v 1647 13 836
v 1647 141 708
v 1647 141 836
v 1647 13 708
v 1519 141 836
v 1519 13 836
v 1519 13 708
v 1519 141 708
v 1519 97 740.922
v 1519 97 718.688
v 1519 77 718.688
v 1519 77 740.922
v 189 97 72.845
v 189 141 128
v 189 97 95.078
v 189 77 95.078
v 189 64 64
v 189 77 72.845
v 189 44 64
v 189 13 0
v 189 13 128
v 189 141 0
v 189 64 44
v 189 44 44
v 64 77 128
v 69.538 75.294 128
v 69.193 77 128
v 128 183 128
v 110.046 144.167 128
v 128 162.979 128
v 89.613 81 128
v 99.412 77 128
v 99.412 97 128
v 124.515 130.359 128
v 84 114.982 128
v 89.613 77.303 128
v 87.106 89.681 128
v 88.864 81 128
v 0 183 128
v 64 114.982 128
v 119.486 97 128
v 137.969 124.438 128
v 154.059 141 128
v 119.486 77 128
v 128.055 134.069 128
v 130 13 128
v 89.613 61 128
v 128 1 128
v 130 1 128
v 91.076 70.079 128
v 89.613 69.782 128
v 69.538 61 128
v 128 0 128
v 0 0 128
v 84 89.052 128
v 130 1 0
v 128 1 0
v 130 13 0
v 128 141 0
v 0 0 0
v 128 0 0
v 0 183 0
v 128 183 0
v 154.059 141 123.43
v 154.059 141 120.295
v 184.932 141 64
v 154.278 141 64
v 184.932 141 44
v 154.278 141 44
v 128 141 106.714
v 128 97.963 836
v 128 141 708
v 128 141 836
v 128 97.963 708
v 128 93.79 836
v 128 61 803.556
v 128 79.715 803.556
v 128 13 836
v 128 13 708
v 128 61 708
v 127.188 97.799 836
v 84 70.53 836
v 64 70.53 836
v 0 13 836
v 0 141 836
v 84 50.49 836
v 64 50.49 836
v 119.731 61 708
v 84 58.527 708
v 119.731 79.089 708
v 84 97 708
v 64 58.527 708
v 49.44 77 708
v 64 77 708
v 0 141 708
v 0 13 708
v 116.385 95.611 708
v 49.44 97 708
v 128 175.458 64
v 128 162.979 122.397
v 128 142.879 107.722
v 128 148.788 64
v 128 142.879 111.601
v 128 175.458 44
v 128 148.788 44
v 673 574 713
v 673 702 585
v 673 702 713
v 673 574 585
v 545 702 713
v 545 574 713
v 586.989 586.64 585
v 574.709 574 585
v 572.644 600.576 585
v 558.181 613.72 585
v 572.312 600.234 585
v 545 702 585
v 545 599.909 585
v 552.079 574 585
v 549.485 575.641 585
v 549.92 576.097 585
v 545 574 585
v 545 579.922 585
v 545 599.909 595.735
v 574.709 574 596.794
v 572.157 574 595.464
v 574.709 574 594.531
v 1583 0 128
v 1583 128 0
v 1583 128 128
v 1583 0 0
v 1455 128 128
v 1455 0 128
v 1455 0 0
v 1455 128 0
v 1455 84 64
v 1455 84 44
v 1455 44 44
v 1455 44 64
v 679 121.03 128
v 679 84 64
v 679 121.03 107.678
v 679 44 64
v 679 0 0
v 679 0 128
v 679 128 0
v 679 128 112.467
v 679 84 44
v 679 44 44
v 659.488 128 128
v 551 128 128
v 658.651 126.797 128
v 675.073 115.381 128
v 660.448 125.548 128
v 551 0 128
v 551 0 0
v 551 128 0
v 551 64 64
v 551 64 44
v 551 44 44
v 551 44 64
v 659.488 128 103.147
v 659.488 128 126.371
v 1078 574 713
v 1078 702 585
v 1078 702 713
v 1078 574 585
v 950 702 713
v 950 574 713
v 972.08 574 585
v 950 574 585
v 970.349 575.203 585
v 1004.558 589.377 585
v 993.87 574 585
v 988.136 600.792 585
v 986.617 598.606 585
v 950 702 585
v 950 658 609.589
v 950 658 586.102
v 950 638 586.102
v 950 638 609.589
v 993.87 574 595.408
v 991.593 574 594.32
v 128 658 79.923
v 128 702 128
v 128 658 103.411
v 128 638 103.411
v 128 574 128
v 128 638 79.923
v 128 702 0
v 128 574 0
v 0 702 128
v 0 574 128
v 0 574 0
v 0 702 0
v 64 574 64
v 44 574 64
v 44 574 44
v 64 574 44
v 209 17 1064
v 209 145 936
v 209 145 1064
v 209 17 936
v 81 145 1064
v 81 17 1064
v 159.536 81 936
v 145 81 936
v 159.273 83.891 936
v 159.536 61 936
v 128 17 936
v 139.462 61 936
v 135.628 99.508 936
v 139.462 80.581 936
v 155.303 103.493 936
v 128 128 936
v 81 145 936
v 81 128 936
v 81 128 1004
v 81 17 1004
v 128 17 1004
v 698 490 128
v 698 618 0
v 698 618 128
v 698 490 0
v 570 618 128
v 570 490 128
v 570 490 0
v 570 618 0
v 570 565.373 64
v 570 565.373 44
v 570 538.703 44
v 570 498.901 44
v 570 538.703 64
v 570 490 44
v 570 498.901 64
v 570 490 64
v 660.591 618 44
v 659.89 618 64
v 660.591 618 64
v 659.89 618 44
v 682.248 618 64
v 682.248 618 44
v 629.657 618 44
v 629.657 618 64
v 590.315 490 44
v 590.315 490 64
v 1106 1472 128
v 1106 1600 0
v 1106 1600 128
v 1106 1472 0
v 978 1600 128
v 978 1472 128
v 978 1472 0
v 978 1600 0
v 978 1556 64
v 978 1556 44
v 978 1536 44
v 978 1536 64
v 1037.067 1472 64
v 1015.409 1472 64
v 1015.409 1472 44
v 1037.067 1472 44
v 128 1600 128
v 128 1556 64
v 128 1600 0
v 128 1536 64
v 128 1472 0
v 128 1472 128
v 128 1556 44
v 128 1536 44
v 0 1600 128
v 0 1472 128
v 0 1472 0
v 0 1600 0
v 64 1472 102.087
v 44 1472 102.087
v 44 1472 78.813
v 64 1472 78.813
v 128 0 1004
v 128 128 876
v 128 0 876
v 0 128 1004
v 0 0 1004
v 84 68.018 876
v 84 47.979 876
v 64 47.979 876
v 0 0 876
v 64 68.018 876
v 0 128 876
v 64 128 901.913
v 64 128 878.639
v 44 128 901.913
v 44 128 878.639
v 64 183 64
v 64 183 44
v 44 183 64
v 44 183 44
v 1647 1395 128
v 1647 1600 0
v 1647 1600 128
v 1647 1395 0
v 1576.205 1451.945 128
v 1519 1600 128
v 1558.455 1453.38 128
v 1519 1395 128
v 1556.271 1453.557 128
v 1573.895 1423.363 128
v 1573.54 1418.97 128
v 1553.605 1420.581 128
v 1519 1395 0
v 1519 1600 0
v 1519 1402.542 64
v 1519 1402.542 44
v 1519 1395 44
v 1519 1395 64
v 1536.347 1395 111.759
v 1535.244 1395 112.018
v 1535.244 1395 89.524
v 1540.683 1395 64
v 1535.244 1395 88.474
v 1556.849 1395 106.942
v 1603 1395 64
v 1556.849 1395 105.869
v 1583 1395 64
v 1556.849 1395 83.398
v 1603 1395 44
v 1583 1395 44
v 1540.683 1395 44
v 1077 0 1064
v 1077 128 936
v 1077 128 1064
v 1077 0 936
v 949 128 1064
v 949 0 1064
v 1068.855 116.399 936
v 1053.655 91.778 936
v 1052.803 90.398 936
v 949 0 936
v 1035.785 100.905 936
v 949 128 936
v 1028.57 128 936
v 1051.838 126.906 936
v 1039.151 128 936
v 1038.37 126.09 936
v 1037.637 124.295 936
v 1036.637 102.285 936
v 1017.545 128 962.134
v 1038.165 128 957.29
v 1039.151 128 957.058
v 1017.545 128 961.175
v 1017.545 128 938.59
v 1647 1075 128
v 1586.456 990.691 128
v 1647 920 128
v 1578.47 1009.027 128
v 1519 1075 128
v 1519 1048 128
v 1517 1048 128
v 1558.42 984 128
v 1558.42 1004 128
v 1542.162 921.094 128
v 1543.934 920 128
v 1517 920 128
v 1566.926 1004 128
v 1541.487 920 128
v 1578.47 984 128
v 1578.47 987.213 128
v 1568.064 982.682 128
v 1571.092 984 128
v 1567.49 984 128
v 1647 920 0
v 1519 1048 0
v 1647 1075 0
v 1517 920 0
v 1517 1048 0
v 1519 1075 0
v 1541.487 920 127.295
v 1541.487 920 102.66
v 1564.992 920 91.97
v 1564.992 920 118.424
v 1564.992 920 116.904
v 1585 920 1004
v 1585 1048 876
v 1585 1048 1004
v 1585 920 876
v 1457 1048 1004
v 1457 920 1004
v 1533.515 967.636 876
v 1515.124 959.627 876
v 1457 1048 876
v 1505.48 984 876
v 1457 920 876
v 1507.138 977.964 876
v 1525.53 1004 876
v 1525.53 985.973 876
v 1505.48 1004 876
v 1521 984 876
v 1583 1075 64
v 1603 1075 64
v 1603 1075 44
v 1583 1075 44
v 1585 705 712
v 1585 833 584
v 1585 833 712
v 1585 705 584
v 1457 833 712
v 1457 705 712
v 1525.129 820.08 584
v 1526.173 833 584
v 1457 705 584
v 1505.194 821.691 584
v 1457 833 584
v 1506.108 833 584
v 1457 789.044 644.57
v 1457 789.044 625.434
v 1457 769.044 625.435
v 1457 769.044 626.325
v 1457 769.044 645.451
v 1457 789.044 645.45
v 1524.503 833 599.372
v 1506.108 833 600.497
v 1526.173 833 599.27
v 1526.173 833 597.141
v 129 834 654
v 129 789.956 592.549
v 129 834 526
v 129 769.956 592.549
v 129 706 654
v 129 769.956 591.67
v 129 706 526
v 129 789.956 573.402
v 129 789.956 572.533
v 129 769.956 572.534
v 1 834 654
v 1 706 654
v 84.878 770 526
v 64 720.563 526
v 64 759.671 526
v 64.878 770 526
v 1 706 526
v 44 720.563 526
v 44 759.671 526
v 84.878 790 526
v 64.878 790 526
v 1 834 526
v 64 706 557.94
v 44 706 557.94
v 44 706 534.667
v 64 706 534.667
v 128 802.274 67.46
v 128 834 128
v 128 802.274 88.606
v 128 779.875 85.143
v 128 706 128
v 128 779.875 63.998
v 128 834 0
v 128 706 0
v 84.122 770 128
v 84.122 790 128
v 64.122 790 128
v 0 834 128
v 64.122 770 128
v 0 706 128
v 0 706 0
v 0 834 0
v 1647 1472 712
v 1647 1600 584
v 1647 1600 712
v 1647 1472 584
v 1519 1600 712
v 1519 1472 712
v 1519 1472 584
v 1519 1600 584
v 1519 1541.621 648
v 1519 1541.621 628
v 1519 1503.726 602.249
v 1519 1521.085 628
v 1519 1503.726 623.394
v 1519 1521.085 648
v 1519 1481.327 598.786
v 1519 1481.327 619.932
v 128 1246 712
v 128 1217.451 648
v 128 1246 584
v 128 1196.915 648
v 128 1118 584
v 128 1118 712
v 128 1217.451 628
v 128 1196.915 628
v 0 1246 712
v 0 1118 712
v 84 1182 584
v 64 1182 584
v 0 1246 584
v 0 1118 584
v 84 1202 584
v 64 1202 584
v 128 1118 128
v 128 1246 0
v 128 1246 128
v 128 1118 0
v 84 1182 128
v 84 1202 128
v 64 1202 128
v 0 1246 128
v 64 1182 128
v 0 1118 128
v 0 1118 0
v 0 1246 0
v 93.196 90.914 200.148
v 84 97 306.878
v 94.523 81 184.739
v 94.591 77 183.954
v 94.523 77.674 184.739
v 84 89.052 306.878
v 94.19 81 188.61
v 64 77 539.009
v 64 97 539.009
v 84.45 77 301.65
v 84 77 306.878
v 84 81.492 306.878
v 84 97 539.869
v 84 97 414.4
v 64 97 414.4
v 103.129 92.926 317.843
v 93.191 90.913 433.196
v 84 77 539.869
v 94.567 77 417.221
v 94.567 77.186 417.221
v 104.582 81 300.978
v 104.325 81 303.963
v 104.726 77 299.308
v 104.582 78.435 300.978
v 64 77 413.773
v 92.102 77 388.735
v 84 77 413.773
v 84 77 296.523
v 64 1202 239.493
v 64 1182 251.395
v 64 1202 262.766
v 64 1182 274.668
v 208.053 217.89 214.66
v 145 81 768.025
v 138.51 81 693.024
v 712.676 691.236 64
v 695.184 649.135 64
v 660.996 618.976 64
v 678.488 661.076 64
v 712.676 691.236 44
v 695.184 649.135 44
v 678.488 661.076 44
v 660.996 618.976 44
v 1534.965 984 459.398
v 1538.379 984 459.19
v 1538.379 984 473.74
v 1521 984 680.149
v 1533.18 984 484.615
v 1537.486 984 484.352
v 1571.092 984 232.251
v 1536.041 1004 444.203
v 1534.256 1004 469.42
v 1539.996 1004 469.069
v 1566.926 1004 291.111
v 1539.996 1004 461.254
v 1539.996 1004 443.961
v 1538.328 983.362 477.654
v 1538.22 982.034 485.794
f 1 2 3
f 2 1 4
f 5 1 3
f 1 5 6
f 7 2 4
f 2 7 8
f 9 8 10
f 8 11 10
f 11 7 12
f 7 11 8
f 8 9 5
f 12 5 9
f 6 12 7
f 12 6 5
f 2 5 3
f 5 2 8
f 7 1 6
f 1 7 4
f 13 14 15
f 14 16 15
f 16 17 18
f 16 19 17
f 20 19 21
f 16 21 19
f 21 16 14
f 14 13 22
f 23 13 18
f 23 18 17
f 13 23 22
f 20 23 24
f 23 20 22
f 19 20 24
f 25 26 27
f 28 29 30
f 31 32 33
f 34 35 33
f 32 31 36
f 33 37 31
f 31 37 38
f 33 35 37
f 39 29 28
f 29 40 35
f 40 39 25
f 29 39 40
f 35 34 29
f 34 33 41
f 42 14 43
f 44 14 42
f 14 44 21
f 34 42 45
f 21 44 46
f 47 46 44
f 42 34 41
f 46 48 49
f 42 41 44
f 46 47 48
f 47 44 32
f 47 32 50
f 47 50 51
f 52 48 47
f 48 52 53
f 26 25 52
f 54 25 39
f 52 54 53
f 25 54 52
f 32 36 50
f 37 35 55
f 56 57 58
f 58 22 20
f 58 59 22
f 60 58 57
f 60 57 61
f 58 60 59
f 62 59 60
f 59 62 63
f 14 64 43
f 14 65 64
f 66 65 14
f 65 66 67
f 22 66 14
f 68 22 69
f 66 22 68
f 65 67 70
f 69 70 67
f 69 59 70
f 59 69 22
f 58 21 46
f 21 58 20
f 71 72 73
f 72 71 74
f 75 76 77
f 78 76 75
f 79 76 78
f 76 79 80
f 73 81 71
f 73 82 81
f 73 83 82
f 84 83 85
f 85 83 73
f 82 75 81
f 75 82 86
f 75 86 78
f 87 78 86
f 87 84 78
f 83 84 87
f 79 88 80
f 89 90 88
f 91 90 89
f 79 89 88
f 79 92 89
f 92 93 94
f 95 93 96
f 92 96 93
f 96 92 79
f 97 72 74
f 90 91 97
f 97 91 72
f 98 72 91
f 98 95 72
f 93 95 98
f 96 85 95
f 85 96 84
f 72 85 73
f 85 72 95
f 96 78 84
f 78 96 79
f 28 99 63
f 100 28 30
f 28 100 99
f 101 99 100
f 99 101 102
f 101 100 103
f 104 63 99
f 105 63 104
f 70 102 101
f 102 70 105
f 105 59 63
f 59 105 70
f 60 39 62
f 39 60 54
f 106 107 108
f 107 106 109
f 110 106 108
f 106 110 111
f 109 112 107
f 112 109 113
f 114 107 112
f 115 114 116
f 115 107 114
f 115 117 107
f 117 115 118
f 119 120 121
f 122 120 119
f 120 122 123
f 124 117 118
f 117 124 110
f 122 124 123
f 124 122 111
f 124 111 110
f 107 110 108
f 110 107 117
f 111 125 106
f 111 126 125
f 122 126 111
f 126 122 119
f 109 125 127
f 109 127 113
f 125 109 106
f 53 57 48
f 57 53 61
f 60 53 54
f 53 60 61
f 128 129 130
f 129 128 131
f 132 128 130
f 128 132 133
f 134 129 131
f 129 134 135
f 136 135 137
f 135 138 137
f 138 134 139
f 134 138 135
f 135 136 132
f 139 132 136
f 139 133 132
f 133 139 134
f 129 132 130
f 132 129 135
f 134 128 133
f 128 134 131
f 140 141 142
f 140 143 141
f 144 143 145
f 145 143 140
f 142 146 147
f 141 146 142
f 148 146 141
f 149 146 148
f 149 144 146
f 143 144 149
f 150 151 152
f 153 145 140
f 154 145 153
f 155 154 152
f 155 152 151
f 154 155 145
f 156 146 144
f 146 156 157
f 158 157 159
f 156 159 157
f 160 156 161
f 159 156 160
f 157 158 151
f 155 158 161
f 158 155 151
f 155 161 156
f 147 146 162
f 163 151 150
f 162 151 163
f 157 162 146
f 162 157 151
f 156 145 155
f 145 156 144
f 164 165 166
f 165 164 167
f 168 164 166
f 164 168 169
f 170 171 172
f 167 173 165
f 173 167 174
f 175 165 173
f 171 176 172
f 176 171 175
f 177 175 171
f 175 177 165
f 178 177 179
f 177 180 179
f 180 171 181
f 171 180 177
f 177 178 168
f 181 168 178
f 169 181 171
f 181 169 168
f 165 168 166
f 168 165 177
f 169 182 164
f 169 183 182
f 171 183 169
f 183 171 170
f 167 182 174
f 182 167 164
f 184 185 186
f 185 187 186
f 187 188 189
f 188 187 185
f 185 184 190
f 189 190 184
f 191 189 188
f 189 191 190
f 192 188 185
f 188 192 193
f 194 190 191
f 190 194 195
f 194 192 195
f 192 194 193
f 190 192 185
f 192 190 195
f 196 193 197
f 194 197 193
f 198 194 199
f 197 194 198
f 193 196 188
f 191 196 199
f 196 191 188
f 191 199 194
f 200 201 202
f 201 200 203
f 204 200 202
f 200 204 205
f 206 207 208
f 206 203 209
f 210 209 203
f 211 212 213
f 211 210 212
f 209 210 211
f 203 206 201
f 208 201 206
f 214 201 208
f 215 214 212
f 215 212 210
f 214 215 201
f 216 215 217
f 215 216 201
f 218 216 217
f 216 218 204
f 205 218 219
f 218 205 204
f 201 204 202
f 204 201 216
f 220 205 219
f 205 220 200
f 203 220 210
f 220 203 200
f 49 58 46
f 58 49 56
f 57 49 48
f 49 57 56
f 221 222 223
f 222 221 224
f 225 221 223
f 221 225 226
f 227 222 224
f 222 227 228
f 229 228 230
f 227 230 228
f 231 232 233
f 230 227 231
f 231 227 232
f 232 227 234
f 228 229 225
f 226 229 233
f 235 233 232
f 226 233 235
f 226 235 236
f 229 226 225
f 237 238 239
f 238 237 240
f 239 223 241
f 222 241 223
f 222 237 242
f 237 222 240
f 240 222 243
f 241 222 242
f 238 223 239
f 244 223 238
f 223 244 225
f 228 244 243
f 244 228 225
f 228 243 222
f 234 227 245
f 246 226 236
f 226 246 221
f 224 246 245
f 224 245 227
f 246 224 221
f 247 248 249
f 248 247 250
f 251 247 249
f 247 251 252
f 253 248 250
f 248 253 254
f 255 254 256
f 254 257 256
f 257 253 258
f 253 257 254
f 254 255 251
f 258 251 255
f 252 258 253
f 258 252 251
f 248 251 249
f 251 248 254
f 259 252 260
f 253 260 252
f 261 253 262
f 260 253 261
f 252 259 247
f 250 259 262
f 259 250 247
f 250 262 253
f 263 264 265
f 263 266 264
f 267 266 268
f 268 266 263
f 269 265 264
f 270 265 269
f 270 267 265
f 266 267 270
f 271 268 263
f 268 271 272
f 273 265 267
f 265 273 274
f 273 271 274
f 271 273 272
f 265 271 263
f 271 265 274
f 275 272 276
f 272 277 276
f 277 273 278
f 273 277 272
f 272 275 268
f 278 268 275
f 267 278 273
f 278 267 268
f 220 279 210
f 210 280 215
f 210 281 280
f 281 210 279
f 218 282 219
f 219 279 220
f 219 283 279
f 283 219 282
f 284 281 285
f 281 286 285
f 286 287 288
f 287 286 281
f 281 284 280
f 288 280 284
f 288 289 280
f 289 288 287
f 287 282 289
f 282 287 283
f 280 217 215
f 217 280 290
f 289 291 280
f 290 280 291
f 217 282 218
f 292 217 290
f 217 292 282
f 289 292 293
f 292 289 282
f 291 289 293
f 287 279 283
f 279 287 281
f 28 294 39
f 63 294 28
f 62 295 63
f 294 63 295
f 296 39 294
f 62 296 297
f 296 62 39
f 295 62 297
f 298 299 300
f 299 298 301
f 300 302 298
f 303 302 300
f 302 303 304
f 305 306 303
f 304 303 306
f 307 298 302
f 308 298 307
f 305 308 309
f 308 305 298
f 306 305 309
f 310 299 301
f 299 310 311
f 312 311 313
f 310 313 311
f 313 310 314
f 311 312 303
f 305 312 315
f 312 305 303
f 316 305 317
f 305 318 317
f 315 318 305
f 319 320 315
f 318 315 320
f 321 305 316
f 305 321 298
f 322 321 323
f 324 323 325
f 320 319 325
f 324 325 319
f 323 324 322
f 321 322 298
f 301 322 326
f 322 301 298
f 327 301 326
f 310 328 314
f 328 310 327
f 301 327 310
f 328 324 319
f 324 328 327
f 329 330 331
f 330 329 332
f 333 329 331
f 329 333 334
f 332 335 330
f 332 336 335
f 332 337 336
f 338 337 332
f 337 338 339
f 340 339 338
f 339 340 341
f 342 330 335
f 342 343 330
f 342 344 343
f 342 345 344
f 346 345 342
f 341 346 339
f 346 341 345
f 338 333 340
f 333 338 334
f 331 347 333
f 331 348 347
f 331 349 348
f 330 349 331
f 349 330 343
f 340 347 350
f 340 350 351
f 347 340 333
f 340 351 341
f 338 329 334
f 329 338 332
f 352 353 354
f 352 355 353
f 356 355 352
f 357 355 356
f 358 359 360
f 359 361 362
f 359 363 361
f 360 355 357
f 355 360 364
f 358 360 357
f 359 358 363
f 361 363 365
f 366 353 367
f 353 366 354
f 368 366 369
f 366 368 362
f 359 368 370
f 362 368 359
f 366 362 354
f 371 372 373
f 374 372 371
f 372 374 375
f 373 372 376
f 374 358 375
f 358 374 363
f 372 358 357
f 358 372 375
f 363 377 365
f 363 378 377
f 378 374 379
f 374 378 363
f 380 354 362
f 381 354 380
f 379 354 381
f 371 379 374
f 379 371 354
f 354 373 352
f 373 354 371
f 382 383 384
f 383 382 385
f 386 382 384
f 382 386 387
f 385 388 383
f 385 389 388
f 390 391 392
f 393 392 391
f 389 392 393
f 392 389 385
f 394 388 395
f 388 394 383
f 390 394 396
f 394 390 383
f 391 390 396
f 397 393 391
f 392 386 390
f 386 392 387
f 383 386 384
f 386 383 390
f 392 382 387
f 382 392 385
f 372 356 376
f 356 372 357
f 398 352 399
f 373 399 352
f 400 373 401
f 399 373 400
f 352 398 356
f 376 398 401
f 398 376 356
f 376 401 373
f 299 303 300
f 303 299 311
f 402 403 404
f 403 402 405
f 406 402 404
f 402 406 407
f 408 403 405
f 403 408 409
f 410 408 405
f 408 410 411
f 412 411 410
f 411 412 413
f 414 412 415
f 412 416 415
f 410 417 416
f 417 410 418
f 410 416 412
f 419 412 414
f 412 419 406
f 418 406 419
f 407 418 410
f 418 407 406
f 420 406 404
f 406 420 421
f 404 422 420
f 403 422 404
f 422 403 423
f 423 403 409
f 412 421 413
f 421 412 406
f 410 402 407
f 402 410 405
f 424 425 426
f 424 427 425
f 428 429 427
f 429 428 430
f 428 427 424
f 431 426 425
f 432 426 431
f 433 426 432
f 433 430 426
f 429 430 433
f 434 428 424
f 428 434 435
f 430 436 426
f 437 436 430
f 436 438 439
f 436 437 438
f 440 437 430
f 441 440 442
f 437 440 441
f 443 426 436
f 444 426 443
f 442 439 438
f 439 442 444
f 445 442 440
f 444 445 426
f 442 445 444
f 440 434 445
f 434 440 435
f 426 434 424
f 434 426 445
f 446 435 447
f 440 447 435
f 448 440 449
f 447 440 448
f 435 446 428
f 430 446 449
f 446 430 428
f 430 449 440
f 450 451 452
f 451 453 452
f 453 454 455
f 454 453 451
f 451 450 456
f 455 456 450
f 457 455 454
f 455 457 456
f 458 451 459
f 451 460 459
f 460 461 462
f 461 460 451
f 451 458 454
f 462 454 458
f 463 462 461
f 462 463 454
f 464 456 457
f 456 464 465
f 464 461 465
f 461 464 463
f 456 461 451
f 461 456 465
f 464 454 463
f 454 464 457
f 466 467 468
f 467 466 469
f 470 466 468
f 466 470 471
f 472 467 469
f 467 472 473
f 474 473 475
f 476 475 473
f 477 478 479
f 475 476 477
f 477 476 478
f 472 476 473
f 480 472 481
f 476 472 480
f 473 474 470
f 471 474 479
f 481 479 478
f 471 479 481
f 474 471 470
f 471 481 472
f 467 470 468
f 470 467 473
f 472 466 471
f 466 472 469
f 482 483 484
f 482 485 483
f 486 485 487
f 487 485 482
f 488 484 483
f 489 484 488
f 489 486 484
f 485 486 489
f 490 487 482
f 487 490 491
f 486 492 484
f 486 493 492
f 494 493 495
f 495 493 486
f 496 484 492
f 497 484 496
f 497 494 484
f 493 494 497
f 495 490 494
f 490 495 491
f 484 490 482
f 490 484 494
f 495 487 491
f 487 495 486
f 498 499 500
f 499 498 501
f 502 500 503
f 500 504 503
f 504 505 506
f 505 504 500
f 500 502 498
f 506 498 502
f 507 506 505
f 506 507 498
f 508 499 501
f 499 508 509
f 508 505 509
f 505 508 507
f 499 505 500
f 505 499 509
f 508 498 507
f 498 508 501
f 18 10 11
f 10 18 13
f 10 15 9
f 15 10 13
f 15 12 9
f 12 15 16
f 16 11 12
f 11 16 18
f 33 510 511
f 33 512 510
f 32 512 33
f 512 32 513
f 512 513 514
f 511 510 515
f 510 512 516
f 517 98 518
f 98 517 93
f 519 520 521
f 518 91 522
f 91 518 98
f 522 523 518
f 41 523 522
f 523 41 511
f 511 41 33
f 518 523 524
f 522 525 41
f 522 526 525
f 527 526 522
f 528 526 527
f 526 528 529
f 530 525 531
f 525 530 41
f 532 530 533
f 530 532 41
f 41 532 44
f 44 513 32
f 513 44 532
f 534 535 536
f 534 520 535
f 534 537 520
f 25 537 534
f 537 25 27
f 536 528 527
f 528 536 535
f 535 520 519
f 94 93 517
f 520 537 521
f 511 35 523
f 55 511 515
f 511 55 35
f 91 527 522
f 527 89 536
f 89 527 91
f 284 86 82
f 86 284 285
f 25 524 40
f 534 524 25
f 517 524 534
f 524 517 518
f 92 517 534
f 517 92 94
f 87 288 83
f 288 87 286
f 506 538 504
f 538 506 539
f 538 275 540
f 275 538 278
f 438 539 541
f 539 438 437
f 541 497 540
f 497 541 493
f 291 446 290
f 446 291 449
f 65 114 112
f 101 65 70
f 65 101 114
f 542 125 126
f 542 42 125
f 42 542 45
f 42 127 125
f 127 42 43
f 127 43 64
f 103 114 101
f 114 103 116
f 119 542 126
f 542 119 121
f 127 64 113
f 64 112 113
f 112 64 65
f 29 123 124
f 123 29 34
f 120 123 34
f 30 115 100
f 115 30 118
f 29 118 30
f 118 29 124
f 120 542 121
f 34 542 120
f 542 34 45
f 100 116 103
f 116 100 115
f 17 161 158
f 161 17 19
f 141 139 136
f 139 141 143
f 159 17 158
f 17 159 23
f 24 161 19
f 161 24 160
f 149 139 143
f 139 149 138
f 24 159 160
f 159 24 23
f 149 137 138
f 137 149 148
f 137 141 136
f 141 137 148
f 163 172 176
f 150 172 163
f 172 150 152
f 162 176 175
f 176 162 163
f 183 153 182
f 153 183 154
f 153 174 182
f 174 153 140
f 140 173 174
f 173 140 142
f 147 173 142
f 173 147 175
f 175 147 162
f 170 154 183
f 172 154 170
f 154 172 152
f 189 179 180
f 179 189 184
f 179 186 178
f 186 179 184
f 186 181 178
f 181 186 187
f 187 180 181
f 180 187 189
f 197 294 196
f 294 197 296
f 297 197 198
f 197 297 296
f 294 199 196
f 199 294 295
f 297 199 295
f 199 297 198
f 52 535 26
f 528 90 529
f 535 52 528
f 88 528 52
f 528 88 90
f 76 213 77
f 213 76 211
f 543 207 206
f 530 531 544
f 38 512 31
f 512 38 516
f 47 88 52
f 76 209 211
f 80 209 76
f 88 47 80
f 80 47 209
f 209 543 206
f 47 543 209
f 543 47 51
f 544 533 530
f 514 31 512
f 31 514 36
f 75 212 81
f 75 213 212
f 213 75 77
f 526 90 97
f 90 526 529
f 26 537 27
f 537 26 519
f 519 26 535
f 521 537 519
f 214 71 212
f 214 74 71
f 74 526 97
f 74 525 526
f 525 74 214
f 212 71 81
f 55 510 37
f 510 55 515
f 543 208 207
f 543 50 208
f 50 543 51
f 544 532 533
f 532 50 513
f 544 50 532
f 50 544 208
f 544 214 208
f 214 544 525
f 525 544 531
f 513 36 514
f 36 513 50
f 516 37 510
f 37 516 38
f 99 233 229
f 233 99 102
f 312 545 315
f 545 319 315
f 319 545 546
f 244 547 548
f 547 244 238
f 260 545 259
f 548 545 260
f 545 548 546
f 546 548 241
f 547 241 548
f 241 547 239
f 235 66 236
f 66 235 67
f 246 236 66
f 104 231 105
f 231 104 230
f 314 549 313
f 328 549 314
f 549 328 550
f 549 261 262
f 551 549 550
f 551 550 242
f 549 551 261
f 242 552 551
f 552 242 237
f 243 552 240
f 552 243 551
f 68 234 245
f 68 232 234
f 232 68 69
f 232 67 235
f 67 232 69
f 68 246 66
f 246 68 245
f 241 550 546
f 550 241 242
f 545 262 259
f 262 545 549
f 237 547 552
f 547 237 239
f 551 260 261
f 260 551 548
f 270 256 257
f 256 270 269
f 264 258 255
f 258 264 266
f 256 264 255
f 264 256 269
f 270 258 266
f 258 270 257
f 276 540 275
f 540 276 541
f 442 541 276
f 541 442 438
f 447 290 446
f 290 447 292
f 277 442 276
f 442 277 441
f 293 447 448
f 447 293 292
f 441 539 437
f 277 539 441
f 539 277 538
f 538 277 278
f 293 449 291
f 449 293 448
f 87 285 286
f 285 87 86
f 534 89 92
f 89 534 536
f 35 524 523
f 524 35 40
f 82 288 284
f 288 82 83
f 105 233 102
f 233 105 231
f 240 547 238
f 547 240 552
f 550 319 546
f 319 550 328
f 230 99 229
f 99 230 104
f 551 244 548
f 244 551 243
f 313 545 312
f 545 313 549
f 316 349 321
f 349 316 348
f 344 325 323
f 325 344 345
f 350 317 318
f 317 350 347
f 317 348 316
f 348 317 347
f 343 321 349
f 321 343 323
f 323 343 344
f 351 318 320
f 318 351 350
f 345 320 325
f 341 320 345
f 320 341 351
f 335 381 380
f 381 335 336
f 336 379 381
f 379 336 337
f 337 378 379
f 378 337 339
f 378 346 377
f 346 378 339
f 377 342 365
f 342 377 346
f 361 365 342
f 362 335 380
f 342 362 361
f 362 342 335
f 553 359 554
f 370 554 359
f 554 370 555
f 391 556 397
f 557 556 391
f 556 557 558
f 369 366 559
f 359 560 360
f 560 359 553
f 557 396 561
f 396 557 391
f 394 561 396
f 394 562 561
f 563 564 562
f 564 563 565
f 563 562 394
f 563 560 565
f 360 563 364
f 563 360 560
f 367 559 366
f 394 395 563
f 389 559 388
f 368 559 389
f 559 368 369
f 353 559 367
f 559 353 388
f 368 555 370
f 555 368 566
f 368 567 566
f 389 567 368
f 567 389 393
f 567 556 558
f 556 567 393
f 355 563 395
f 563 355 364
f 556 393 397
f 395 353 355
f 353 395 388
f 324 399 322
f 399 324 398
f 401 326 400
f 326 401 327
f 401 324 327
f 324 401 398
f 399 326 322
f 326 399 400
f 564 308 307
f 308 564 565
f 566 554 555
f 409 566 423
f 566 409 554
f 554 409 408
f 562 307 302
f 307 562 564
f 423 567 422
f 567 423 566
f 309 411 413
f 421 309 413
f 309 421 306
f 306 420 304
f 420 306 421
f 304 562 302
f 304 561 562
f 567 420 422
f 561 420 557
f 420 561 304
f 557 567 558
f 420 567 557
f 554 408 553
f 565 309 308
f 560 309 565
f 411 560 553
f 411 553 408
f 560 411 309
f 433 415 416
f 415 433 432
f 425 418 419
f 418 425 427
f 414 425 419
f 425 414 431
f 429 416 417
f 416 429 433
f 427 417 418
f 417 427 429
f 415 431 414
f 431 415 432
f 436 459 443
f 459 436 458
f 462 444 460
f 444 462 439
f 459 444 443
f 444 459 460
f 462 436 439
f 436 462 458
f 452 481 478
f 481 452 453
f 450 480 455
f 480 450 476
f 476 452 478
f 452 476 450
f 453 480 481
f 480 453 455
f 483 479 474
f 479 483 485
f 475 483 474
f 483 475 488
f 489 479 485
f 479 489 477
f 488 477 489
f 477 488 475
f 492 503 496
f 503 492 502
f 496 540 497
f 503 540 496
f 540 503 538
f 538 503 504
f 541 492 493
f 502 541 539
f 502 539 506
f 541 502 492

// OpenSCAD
union() {
	%cube(size = [2560, 1600, 1000]);
	translate(v = [1519.0, 13.0, 708.0]) {
		cube(size = [128, 128, 128]);
	}
	translate(v = [61.0, 13.0, 0.0]) {
		cube(size = [128, 128, 128]);
	}
	translate(v = [0.0, 13.0, 708.0]) {
		cube(size = [128, 128, 128]);
	}
	translate(v = [0.0, 13.0, 0.0]) {
		cube(size = [128, 128, 128]);
	}
	translate(v = [545.0, 574.0, 585.0]) {
		cube(size = [128, 128, 128]);
	}
	translate(v = [1.0, 4.0, 0.0]) {
		cube(size = [128, 128, 128]);
	}
	translate(v = [0.0, 0.0, 0.0]) {
		cube(size = [128, 128, 128]);
	}
	translate(v = [1455.0, 0.0, 0.0]) {
		cube(size = [128, 128, 128]);
	}
	translate(v = [551.0, 0.0, 0.0]) {
		cube(size = [128, 128, 128]);
	}
	translate(v = [950.0, 574.0, 585.0]) {
		cube(size = [128, 128, 128]);
	}
	translate(v = [0.0, 574.0, 0.0]) {
		cube(size = [128, 128, 128]);
	}
	translate(v = [0.0, 17.0, 0.0]) {
		cube(size = [128, 128, 128]);
	}
	translate(v = [81.0, 17.0, 936.0]) {
		cube(size = [128, 128, 128]);
	}
	translate(v = [2.0, 1.0, 0.0]) {
		cube(size = [128, 128, 128]);
	}
	translate(v = [570.0, 490.0, 0.0]) {
		cube(size = [128, 128, 128]);
	}
	translate(v = [978.0, 1472.0, 0.0]) {
		cube(size = [128, 128, 128]);
	}
	translate(v = [0.0, 1472.0, 0.0]) {
		cube(size = [128, 128, 128]);
	}
	translate(v = [0.0, 0.0, 876.0]) {
		cube(size = [128, 128, 128]);
	}
	translate(v = [0.0, 55.0, 0.0]) {
		cube(size = [128, 128, 128]);
	}
	translate(v = [1519.0, 1395.0, 0.0]) {
		cube(size = [128, 128, 128]);
	}
	translate(v = [949.0, 0.0, 936.0]) {
		cube(size = [128, 128, 128]);
	}
	translate(v = [1517.0, 920.0, 0.0]) {
		cube(size = [128, 128, 128]);
	}
	translate(v = [1519.0, 920.0, 0.0]) {
		cube(size = [128, 128, 128]);
	}
	translate(v = [1457.0, 920.0, 876.0]) {
		cube(size = [128, 128, 128]);
	}
	translate(v = [1519.0, 947.0, 0.0]) {
		cube(size = [128, 128, 128]);
	}
	translate(v = [1519.0, 1472.0, 0.0]) {
		cube(size = [128, 128, 128]);
	}
	translate(v = [1457.0, 705.0, 584.0]) {
		cube(size = [128, 128, 128]);
	}
	translate(v = [1.0000000000000142, 706.0, 526.0]) {
		cube(size = [128, 128, 128]);
	}
	translate(v = [0.0, 706.0, 0.0]) {
		cube(size = [128, 128, 128]);
	}
	translate(v = [1519.0, 1472.0, 584.0]) {
		cube(size = [128, 128, 128]);
	}
	translate(v = [0.0, 1118.0, 584.0]) {
		cube(size = [128, 128, 128]);
	}
	translate(v = [0.0, 1118.0, 0.0]) {
		cube(size = [128, 128, 128]);
	}
	translate(v = [125.0, 77.0, 64.0]) {
		rotate(a = [0, 64.098943030772, 0.0]) {
			cube(size = [20, 20, 1620.8109081567782]);
		}
	}
	translate(v = [64.0, 77.0, 772.0]) {
		rotate(a = [0, 175.07566003854686, 0.0]) {
			cube(size = [20, 20, 710.6229661360517]);
		}
	}
	translate(v = [64.0, 77.0, 64.0]) {
		rotate(a = [0, 0.0, 0.0]) {
			cube(size = [20, 20, 708.0]);
		}
	}
	translate(v = [609.0, 638.0, 649.0]) {
		rotate(a = [0, 126.79450797128564, -134.17118577876232]) {
			cube(size = [20, 20, 976.7143901878379]);
		}
	}
	translate(v = [65.0, 68.0, 64.0]) {
		rotate(a = [0, 53.40794718639926, 46.337001674882835]) {
			cube(size = [20, 20, 981.3567139424889]);
		}
	}
	translate(v = [64.0, 64.0, 64.0]) {
		rotate(a = [0, 90.0, 75.96375653207353]) {
			cube(size = [20, 20, 4.123105625617661]);
		}
	}
	translate(v = [1519.0, 64.0, 64.0]) {
		rotate(a = [0, 90.0, 180.0]) {
			cube(size = [20, 20, 1455.0]);
		}
	}
	translate(v = [615.0, 64.0, 64.0]) {
		rotate(a = [0, 90.0, 0.0]) {
			cube(size = [20, 20, 904.0]);
		}
	}
	translate(v = [1014.0, 638.0, 649.0]) {
		rotate(a = [0, 129.92410227266922, -124.80401175271321]) {
			cube(size = [20, 20, 911.5382603050735]);
		}
	}
	translate(v = [64.0, 638.0, 64.0]) {
		rotate(a = [0, 58.37567574028464, 0.0]) {
			cube(size = [20, 20, 1115.6724429688134]);
		}
	}
	translate(v = [64.0, 81.0, 64.0]) {
		rotate(a = [0, 90.0, 90.0]) {
			cube(size = [20, 20, 557.0]);
		}
	}
	translate(v = [145.0, 81.0, 1000.0]) {
		rotate(a = [0, 175.05403345289585, 180.0]) {
			cube(size = [20, 20, 939.4982703549805]);
		}
	}
	translate(v = [66.0, 65.0, 64.0]) {
		rotate(a = [0, 4.921903522351797, 11.449337988500032]) {
			cube(size = [20, 20, 939.46420900426]);
		}
	}
	translate(v = [634.0, 554.0, 64.0]) {
		rotate(a = [0, 90.0, -139.27432976270237]) {
			cube(size = [20, 20, 749.496497656927]);
		}
	}
	translate(v = [1042.0, 1536.0, 64.0]) {
		rotate(a = [0, 90.0, -112.56183972820888]) {
			cube(size = [20, 20, 1063.3851607014271]);
		}
	}
	translate(v = [64.0, 1536.0, 64.0]) {
		rotate(a = [0, 90.0, 0.0]) {
			cube(size = [20, 20, 978.0]);
		}
	}
	translate(v = [64.0, 64.0, 940.0]) {
		rotate(a = [0, 120.75724480495329, 90.0]) {
			cube(size = [20, 20, 1712.9389948273115]);
		}
	}
	translate(v = [64.0, 119.0, 64.0]) {
		rotate(a = [0, 3.5926219957691203, -90.0]) {
			cube(size = [20, 20, 877.724899954422]);
		}
	}
	translate(v = [1583.0, 1459.0, 64.0]) {
		rotate(a = [0, 90.0, -138.58257261937237]) {
			cube(size = [20, 20, 2025.5767080019457]);
		}
	}
	translate(v = [1013.0, 64.0, 1000.0]) {
		rotate(a = [0, 121.8451799879658, 67.77496954888645]) {
			cube(size = [20, 20, 1773.9844982411769]);
		}
	}
	translate(v = [1581.0, 984.0, 64.0]) {
		rotate(a = [0, 49.11747522174526, -121.69082130459954]) {
			cube(size = [20, 20, 1430.0769210080973]);
		}
	}
	translate(v = [1583.0, 984.0, 64.0]) {
		rotate(a = [0, 90.0, 180.0]) {
			cube(size = [20, 20, 2.0]);
		}
	}
	translate(v = [1521.0, 984.0, 940.0]) {
		rotate(a = [0, 175.95157015591212, 0.0]) {
			cube(size = [20, 20, 878.1913231181461]);
		}
	}
	translate(v = [1583.0, 1011.0, 64.0]) {
		rotate(a = [0, 4.414267567501035, -156.467651439099]) {
			cube(size = [20, 20, 878.6062827000499]);
		}
	}
	translate(v = [1583.0, 1536.0, 64.0]) {
		rotate(a = [0, 90.0, -90.0]) {
			cube(size = [20, 20, 525.0]);
		}
	}
	translate(v = [1521.0, 769.0, 648.0]) {
		rotate(a = [0, 127.19604825646866, 85.37857719793767]) {
			cube(size = [20, 20, 966.0170805943341]);
		}
	}
	translate(v = [65.00000000000001, 770.0, 590.0]) {
		rotate(a = [0, 87.71881982923496, -0.039351490730798445]) {
			cube(size = [20, 20, 1457.155104990543]);
		}
	}
	translate(v = [64.0, 770.0, 64.0]) {
		rotate(a = [0, 0.10892720624465255, 0.0]) {
			cube(size = [20, 20, 526.0009505694833]);
		}
	}
	translate(v = [1583.0, 1536.0, 648.0]) {
		rotate(a = [0, 108.9465764671198, -153.23914381923956]) {
			cube(size = [20, 20, 1798.6586668959733]);
		}
	}
	translate(v = [64.0, 1182.0, 648.0]) {
		rotate(a = [0, 90.0, 13.118520201927982]) {
			cube(size = [20, 20, 1559.7041386109097]);
		}
	}
	translate(v = [64.0, 1182.0, 64.0]) {
		rotate(a = [0, 0.0, 0.0]) {
			cube(size = [20, 20, 584.0]);
		}
	}
}
